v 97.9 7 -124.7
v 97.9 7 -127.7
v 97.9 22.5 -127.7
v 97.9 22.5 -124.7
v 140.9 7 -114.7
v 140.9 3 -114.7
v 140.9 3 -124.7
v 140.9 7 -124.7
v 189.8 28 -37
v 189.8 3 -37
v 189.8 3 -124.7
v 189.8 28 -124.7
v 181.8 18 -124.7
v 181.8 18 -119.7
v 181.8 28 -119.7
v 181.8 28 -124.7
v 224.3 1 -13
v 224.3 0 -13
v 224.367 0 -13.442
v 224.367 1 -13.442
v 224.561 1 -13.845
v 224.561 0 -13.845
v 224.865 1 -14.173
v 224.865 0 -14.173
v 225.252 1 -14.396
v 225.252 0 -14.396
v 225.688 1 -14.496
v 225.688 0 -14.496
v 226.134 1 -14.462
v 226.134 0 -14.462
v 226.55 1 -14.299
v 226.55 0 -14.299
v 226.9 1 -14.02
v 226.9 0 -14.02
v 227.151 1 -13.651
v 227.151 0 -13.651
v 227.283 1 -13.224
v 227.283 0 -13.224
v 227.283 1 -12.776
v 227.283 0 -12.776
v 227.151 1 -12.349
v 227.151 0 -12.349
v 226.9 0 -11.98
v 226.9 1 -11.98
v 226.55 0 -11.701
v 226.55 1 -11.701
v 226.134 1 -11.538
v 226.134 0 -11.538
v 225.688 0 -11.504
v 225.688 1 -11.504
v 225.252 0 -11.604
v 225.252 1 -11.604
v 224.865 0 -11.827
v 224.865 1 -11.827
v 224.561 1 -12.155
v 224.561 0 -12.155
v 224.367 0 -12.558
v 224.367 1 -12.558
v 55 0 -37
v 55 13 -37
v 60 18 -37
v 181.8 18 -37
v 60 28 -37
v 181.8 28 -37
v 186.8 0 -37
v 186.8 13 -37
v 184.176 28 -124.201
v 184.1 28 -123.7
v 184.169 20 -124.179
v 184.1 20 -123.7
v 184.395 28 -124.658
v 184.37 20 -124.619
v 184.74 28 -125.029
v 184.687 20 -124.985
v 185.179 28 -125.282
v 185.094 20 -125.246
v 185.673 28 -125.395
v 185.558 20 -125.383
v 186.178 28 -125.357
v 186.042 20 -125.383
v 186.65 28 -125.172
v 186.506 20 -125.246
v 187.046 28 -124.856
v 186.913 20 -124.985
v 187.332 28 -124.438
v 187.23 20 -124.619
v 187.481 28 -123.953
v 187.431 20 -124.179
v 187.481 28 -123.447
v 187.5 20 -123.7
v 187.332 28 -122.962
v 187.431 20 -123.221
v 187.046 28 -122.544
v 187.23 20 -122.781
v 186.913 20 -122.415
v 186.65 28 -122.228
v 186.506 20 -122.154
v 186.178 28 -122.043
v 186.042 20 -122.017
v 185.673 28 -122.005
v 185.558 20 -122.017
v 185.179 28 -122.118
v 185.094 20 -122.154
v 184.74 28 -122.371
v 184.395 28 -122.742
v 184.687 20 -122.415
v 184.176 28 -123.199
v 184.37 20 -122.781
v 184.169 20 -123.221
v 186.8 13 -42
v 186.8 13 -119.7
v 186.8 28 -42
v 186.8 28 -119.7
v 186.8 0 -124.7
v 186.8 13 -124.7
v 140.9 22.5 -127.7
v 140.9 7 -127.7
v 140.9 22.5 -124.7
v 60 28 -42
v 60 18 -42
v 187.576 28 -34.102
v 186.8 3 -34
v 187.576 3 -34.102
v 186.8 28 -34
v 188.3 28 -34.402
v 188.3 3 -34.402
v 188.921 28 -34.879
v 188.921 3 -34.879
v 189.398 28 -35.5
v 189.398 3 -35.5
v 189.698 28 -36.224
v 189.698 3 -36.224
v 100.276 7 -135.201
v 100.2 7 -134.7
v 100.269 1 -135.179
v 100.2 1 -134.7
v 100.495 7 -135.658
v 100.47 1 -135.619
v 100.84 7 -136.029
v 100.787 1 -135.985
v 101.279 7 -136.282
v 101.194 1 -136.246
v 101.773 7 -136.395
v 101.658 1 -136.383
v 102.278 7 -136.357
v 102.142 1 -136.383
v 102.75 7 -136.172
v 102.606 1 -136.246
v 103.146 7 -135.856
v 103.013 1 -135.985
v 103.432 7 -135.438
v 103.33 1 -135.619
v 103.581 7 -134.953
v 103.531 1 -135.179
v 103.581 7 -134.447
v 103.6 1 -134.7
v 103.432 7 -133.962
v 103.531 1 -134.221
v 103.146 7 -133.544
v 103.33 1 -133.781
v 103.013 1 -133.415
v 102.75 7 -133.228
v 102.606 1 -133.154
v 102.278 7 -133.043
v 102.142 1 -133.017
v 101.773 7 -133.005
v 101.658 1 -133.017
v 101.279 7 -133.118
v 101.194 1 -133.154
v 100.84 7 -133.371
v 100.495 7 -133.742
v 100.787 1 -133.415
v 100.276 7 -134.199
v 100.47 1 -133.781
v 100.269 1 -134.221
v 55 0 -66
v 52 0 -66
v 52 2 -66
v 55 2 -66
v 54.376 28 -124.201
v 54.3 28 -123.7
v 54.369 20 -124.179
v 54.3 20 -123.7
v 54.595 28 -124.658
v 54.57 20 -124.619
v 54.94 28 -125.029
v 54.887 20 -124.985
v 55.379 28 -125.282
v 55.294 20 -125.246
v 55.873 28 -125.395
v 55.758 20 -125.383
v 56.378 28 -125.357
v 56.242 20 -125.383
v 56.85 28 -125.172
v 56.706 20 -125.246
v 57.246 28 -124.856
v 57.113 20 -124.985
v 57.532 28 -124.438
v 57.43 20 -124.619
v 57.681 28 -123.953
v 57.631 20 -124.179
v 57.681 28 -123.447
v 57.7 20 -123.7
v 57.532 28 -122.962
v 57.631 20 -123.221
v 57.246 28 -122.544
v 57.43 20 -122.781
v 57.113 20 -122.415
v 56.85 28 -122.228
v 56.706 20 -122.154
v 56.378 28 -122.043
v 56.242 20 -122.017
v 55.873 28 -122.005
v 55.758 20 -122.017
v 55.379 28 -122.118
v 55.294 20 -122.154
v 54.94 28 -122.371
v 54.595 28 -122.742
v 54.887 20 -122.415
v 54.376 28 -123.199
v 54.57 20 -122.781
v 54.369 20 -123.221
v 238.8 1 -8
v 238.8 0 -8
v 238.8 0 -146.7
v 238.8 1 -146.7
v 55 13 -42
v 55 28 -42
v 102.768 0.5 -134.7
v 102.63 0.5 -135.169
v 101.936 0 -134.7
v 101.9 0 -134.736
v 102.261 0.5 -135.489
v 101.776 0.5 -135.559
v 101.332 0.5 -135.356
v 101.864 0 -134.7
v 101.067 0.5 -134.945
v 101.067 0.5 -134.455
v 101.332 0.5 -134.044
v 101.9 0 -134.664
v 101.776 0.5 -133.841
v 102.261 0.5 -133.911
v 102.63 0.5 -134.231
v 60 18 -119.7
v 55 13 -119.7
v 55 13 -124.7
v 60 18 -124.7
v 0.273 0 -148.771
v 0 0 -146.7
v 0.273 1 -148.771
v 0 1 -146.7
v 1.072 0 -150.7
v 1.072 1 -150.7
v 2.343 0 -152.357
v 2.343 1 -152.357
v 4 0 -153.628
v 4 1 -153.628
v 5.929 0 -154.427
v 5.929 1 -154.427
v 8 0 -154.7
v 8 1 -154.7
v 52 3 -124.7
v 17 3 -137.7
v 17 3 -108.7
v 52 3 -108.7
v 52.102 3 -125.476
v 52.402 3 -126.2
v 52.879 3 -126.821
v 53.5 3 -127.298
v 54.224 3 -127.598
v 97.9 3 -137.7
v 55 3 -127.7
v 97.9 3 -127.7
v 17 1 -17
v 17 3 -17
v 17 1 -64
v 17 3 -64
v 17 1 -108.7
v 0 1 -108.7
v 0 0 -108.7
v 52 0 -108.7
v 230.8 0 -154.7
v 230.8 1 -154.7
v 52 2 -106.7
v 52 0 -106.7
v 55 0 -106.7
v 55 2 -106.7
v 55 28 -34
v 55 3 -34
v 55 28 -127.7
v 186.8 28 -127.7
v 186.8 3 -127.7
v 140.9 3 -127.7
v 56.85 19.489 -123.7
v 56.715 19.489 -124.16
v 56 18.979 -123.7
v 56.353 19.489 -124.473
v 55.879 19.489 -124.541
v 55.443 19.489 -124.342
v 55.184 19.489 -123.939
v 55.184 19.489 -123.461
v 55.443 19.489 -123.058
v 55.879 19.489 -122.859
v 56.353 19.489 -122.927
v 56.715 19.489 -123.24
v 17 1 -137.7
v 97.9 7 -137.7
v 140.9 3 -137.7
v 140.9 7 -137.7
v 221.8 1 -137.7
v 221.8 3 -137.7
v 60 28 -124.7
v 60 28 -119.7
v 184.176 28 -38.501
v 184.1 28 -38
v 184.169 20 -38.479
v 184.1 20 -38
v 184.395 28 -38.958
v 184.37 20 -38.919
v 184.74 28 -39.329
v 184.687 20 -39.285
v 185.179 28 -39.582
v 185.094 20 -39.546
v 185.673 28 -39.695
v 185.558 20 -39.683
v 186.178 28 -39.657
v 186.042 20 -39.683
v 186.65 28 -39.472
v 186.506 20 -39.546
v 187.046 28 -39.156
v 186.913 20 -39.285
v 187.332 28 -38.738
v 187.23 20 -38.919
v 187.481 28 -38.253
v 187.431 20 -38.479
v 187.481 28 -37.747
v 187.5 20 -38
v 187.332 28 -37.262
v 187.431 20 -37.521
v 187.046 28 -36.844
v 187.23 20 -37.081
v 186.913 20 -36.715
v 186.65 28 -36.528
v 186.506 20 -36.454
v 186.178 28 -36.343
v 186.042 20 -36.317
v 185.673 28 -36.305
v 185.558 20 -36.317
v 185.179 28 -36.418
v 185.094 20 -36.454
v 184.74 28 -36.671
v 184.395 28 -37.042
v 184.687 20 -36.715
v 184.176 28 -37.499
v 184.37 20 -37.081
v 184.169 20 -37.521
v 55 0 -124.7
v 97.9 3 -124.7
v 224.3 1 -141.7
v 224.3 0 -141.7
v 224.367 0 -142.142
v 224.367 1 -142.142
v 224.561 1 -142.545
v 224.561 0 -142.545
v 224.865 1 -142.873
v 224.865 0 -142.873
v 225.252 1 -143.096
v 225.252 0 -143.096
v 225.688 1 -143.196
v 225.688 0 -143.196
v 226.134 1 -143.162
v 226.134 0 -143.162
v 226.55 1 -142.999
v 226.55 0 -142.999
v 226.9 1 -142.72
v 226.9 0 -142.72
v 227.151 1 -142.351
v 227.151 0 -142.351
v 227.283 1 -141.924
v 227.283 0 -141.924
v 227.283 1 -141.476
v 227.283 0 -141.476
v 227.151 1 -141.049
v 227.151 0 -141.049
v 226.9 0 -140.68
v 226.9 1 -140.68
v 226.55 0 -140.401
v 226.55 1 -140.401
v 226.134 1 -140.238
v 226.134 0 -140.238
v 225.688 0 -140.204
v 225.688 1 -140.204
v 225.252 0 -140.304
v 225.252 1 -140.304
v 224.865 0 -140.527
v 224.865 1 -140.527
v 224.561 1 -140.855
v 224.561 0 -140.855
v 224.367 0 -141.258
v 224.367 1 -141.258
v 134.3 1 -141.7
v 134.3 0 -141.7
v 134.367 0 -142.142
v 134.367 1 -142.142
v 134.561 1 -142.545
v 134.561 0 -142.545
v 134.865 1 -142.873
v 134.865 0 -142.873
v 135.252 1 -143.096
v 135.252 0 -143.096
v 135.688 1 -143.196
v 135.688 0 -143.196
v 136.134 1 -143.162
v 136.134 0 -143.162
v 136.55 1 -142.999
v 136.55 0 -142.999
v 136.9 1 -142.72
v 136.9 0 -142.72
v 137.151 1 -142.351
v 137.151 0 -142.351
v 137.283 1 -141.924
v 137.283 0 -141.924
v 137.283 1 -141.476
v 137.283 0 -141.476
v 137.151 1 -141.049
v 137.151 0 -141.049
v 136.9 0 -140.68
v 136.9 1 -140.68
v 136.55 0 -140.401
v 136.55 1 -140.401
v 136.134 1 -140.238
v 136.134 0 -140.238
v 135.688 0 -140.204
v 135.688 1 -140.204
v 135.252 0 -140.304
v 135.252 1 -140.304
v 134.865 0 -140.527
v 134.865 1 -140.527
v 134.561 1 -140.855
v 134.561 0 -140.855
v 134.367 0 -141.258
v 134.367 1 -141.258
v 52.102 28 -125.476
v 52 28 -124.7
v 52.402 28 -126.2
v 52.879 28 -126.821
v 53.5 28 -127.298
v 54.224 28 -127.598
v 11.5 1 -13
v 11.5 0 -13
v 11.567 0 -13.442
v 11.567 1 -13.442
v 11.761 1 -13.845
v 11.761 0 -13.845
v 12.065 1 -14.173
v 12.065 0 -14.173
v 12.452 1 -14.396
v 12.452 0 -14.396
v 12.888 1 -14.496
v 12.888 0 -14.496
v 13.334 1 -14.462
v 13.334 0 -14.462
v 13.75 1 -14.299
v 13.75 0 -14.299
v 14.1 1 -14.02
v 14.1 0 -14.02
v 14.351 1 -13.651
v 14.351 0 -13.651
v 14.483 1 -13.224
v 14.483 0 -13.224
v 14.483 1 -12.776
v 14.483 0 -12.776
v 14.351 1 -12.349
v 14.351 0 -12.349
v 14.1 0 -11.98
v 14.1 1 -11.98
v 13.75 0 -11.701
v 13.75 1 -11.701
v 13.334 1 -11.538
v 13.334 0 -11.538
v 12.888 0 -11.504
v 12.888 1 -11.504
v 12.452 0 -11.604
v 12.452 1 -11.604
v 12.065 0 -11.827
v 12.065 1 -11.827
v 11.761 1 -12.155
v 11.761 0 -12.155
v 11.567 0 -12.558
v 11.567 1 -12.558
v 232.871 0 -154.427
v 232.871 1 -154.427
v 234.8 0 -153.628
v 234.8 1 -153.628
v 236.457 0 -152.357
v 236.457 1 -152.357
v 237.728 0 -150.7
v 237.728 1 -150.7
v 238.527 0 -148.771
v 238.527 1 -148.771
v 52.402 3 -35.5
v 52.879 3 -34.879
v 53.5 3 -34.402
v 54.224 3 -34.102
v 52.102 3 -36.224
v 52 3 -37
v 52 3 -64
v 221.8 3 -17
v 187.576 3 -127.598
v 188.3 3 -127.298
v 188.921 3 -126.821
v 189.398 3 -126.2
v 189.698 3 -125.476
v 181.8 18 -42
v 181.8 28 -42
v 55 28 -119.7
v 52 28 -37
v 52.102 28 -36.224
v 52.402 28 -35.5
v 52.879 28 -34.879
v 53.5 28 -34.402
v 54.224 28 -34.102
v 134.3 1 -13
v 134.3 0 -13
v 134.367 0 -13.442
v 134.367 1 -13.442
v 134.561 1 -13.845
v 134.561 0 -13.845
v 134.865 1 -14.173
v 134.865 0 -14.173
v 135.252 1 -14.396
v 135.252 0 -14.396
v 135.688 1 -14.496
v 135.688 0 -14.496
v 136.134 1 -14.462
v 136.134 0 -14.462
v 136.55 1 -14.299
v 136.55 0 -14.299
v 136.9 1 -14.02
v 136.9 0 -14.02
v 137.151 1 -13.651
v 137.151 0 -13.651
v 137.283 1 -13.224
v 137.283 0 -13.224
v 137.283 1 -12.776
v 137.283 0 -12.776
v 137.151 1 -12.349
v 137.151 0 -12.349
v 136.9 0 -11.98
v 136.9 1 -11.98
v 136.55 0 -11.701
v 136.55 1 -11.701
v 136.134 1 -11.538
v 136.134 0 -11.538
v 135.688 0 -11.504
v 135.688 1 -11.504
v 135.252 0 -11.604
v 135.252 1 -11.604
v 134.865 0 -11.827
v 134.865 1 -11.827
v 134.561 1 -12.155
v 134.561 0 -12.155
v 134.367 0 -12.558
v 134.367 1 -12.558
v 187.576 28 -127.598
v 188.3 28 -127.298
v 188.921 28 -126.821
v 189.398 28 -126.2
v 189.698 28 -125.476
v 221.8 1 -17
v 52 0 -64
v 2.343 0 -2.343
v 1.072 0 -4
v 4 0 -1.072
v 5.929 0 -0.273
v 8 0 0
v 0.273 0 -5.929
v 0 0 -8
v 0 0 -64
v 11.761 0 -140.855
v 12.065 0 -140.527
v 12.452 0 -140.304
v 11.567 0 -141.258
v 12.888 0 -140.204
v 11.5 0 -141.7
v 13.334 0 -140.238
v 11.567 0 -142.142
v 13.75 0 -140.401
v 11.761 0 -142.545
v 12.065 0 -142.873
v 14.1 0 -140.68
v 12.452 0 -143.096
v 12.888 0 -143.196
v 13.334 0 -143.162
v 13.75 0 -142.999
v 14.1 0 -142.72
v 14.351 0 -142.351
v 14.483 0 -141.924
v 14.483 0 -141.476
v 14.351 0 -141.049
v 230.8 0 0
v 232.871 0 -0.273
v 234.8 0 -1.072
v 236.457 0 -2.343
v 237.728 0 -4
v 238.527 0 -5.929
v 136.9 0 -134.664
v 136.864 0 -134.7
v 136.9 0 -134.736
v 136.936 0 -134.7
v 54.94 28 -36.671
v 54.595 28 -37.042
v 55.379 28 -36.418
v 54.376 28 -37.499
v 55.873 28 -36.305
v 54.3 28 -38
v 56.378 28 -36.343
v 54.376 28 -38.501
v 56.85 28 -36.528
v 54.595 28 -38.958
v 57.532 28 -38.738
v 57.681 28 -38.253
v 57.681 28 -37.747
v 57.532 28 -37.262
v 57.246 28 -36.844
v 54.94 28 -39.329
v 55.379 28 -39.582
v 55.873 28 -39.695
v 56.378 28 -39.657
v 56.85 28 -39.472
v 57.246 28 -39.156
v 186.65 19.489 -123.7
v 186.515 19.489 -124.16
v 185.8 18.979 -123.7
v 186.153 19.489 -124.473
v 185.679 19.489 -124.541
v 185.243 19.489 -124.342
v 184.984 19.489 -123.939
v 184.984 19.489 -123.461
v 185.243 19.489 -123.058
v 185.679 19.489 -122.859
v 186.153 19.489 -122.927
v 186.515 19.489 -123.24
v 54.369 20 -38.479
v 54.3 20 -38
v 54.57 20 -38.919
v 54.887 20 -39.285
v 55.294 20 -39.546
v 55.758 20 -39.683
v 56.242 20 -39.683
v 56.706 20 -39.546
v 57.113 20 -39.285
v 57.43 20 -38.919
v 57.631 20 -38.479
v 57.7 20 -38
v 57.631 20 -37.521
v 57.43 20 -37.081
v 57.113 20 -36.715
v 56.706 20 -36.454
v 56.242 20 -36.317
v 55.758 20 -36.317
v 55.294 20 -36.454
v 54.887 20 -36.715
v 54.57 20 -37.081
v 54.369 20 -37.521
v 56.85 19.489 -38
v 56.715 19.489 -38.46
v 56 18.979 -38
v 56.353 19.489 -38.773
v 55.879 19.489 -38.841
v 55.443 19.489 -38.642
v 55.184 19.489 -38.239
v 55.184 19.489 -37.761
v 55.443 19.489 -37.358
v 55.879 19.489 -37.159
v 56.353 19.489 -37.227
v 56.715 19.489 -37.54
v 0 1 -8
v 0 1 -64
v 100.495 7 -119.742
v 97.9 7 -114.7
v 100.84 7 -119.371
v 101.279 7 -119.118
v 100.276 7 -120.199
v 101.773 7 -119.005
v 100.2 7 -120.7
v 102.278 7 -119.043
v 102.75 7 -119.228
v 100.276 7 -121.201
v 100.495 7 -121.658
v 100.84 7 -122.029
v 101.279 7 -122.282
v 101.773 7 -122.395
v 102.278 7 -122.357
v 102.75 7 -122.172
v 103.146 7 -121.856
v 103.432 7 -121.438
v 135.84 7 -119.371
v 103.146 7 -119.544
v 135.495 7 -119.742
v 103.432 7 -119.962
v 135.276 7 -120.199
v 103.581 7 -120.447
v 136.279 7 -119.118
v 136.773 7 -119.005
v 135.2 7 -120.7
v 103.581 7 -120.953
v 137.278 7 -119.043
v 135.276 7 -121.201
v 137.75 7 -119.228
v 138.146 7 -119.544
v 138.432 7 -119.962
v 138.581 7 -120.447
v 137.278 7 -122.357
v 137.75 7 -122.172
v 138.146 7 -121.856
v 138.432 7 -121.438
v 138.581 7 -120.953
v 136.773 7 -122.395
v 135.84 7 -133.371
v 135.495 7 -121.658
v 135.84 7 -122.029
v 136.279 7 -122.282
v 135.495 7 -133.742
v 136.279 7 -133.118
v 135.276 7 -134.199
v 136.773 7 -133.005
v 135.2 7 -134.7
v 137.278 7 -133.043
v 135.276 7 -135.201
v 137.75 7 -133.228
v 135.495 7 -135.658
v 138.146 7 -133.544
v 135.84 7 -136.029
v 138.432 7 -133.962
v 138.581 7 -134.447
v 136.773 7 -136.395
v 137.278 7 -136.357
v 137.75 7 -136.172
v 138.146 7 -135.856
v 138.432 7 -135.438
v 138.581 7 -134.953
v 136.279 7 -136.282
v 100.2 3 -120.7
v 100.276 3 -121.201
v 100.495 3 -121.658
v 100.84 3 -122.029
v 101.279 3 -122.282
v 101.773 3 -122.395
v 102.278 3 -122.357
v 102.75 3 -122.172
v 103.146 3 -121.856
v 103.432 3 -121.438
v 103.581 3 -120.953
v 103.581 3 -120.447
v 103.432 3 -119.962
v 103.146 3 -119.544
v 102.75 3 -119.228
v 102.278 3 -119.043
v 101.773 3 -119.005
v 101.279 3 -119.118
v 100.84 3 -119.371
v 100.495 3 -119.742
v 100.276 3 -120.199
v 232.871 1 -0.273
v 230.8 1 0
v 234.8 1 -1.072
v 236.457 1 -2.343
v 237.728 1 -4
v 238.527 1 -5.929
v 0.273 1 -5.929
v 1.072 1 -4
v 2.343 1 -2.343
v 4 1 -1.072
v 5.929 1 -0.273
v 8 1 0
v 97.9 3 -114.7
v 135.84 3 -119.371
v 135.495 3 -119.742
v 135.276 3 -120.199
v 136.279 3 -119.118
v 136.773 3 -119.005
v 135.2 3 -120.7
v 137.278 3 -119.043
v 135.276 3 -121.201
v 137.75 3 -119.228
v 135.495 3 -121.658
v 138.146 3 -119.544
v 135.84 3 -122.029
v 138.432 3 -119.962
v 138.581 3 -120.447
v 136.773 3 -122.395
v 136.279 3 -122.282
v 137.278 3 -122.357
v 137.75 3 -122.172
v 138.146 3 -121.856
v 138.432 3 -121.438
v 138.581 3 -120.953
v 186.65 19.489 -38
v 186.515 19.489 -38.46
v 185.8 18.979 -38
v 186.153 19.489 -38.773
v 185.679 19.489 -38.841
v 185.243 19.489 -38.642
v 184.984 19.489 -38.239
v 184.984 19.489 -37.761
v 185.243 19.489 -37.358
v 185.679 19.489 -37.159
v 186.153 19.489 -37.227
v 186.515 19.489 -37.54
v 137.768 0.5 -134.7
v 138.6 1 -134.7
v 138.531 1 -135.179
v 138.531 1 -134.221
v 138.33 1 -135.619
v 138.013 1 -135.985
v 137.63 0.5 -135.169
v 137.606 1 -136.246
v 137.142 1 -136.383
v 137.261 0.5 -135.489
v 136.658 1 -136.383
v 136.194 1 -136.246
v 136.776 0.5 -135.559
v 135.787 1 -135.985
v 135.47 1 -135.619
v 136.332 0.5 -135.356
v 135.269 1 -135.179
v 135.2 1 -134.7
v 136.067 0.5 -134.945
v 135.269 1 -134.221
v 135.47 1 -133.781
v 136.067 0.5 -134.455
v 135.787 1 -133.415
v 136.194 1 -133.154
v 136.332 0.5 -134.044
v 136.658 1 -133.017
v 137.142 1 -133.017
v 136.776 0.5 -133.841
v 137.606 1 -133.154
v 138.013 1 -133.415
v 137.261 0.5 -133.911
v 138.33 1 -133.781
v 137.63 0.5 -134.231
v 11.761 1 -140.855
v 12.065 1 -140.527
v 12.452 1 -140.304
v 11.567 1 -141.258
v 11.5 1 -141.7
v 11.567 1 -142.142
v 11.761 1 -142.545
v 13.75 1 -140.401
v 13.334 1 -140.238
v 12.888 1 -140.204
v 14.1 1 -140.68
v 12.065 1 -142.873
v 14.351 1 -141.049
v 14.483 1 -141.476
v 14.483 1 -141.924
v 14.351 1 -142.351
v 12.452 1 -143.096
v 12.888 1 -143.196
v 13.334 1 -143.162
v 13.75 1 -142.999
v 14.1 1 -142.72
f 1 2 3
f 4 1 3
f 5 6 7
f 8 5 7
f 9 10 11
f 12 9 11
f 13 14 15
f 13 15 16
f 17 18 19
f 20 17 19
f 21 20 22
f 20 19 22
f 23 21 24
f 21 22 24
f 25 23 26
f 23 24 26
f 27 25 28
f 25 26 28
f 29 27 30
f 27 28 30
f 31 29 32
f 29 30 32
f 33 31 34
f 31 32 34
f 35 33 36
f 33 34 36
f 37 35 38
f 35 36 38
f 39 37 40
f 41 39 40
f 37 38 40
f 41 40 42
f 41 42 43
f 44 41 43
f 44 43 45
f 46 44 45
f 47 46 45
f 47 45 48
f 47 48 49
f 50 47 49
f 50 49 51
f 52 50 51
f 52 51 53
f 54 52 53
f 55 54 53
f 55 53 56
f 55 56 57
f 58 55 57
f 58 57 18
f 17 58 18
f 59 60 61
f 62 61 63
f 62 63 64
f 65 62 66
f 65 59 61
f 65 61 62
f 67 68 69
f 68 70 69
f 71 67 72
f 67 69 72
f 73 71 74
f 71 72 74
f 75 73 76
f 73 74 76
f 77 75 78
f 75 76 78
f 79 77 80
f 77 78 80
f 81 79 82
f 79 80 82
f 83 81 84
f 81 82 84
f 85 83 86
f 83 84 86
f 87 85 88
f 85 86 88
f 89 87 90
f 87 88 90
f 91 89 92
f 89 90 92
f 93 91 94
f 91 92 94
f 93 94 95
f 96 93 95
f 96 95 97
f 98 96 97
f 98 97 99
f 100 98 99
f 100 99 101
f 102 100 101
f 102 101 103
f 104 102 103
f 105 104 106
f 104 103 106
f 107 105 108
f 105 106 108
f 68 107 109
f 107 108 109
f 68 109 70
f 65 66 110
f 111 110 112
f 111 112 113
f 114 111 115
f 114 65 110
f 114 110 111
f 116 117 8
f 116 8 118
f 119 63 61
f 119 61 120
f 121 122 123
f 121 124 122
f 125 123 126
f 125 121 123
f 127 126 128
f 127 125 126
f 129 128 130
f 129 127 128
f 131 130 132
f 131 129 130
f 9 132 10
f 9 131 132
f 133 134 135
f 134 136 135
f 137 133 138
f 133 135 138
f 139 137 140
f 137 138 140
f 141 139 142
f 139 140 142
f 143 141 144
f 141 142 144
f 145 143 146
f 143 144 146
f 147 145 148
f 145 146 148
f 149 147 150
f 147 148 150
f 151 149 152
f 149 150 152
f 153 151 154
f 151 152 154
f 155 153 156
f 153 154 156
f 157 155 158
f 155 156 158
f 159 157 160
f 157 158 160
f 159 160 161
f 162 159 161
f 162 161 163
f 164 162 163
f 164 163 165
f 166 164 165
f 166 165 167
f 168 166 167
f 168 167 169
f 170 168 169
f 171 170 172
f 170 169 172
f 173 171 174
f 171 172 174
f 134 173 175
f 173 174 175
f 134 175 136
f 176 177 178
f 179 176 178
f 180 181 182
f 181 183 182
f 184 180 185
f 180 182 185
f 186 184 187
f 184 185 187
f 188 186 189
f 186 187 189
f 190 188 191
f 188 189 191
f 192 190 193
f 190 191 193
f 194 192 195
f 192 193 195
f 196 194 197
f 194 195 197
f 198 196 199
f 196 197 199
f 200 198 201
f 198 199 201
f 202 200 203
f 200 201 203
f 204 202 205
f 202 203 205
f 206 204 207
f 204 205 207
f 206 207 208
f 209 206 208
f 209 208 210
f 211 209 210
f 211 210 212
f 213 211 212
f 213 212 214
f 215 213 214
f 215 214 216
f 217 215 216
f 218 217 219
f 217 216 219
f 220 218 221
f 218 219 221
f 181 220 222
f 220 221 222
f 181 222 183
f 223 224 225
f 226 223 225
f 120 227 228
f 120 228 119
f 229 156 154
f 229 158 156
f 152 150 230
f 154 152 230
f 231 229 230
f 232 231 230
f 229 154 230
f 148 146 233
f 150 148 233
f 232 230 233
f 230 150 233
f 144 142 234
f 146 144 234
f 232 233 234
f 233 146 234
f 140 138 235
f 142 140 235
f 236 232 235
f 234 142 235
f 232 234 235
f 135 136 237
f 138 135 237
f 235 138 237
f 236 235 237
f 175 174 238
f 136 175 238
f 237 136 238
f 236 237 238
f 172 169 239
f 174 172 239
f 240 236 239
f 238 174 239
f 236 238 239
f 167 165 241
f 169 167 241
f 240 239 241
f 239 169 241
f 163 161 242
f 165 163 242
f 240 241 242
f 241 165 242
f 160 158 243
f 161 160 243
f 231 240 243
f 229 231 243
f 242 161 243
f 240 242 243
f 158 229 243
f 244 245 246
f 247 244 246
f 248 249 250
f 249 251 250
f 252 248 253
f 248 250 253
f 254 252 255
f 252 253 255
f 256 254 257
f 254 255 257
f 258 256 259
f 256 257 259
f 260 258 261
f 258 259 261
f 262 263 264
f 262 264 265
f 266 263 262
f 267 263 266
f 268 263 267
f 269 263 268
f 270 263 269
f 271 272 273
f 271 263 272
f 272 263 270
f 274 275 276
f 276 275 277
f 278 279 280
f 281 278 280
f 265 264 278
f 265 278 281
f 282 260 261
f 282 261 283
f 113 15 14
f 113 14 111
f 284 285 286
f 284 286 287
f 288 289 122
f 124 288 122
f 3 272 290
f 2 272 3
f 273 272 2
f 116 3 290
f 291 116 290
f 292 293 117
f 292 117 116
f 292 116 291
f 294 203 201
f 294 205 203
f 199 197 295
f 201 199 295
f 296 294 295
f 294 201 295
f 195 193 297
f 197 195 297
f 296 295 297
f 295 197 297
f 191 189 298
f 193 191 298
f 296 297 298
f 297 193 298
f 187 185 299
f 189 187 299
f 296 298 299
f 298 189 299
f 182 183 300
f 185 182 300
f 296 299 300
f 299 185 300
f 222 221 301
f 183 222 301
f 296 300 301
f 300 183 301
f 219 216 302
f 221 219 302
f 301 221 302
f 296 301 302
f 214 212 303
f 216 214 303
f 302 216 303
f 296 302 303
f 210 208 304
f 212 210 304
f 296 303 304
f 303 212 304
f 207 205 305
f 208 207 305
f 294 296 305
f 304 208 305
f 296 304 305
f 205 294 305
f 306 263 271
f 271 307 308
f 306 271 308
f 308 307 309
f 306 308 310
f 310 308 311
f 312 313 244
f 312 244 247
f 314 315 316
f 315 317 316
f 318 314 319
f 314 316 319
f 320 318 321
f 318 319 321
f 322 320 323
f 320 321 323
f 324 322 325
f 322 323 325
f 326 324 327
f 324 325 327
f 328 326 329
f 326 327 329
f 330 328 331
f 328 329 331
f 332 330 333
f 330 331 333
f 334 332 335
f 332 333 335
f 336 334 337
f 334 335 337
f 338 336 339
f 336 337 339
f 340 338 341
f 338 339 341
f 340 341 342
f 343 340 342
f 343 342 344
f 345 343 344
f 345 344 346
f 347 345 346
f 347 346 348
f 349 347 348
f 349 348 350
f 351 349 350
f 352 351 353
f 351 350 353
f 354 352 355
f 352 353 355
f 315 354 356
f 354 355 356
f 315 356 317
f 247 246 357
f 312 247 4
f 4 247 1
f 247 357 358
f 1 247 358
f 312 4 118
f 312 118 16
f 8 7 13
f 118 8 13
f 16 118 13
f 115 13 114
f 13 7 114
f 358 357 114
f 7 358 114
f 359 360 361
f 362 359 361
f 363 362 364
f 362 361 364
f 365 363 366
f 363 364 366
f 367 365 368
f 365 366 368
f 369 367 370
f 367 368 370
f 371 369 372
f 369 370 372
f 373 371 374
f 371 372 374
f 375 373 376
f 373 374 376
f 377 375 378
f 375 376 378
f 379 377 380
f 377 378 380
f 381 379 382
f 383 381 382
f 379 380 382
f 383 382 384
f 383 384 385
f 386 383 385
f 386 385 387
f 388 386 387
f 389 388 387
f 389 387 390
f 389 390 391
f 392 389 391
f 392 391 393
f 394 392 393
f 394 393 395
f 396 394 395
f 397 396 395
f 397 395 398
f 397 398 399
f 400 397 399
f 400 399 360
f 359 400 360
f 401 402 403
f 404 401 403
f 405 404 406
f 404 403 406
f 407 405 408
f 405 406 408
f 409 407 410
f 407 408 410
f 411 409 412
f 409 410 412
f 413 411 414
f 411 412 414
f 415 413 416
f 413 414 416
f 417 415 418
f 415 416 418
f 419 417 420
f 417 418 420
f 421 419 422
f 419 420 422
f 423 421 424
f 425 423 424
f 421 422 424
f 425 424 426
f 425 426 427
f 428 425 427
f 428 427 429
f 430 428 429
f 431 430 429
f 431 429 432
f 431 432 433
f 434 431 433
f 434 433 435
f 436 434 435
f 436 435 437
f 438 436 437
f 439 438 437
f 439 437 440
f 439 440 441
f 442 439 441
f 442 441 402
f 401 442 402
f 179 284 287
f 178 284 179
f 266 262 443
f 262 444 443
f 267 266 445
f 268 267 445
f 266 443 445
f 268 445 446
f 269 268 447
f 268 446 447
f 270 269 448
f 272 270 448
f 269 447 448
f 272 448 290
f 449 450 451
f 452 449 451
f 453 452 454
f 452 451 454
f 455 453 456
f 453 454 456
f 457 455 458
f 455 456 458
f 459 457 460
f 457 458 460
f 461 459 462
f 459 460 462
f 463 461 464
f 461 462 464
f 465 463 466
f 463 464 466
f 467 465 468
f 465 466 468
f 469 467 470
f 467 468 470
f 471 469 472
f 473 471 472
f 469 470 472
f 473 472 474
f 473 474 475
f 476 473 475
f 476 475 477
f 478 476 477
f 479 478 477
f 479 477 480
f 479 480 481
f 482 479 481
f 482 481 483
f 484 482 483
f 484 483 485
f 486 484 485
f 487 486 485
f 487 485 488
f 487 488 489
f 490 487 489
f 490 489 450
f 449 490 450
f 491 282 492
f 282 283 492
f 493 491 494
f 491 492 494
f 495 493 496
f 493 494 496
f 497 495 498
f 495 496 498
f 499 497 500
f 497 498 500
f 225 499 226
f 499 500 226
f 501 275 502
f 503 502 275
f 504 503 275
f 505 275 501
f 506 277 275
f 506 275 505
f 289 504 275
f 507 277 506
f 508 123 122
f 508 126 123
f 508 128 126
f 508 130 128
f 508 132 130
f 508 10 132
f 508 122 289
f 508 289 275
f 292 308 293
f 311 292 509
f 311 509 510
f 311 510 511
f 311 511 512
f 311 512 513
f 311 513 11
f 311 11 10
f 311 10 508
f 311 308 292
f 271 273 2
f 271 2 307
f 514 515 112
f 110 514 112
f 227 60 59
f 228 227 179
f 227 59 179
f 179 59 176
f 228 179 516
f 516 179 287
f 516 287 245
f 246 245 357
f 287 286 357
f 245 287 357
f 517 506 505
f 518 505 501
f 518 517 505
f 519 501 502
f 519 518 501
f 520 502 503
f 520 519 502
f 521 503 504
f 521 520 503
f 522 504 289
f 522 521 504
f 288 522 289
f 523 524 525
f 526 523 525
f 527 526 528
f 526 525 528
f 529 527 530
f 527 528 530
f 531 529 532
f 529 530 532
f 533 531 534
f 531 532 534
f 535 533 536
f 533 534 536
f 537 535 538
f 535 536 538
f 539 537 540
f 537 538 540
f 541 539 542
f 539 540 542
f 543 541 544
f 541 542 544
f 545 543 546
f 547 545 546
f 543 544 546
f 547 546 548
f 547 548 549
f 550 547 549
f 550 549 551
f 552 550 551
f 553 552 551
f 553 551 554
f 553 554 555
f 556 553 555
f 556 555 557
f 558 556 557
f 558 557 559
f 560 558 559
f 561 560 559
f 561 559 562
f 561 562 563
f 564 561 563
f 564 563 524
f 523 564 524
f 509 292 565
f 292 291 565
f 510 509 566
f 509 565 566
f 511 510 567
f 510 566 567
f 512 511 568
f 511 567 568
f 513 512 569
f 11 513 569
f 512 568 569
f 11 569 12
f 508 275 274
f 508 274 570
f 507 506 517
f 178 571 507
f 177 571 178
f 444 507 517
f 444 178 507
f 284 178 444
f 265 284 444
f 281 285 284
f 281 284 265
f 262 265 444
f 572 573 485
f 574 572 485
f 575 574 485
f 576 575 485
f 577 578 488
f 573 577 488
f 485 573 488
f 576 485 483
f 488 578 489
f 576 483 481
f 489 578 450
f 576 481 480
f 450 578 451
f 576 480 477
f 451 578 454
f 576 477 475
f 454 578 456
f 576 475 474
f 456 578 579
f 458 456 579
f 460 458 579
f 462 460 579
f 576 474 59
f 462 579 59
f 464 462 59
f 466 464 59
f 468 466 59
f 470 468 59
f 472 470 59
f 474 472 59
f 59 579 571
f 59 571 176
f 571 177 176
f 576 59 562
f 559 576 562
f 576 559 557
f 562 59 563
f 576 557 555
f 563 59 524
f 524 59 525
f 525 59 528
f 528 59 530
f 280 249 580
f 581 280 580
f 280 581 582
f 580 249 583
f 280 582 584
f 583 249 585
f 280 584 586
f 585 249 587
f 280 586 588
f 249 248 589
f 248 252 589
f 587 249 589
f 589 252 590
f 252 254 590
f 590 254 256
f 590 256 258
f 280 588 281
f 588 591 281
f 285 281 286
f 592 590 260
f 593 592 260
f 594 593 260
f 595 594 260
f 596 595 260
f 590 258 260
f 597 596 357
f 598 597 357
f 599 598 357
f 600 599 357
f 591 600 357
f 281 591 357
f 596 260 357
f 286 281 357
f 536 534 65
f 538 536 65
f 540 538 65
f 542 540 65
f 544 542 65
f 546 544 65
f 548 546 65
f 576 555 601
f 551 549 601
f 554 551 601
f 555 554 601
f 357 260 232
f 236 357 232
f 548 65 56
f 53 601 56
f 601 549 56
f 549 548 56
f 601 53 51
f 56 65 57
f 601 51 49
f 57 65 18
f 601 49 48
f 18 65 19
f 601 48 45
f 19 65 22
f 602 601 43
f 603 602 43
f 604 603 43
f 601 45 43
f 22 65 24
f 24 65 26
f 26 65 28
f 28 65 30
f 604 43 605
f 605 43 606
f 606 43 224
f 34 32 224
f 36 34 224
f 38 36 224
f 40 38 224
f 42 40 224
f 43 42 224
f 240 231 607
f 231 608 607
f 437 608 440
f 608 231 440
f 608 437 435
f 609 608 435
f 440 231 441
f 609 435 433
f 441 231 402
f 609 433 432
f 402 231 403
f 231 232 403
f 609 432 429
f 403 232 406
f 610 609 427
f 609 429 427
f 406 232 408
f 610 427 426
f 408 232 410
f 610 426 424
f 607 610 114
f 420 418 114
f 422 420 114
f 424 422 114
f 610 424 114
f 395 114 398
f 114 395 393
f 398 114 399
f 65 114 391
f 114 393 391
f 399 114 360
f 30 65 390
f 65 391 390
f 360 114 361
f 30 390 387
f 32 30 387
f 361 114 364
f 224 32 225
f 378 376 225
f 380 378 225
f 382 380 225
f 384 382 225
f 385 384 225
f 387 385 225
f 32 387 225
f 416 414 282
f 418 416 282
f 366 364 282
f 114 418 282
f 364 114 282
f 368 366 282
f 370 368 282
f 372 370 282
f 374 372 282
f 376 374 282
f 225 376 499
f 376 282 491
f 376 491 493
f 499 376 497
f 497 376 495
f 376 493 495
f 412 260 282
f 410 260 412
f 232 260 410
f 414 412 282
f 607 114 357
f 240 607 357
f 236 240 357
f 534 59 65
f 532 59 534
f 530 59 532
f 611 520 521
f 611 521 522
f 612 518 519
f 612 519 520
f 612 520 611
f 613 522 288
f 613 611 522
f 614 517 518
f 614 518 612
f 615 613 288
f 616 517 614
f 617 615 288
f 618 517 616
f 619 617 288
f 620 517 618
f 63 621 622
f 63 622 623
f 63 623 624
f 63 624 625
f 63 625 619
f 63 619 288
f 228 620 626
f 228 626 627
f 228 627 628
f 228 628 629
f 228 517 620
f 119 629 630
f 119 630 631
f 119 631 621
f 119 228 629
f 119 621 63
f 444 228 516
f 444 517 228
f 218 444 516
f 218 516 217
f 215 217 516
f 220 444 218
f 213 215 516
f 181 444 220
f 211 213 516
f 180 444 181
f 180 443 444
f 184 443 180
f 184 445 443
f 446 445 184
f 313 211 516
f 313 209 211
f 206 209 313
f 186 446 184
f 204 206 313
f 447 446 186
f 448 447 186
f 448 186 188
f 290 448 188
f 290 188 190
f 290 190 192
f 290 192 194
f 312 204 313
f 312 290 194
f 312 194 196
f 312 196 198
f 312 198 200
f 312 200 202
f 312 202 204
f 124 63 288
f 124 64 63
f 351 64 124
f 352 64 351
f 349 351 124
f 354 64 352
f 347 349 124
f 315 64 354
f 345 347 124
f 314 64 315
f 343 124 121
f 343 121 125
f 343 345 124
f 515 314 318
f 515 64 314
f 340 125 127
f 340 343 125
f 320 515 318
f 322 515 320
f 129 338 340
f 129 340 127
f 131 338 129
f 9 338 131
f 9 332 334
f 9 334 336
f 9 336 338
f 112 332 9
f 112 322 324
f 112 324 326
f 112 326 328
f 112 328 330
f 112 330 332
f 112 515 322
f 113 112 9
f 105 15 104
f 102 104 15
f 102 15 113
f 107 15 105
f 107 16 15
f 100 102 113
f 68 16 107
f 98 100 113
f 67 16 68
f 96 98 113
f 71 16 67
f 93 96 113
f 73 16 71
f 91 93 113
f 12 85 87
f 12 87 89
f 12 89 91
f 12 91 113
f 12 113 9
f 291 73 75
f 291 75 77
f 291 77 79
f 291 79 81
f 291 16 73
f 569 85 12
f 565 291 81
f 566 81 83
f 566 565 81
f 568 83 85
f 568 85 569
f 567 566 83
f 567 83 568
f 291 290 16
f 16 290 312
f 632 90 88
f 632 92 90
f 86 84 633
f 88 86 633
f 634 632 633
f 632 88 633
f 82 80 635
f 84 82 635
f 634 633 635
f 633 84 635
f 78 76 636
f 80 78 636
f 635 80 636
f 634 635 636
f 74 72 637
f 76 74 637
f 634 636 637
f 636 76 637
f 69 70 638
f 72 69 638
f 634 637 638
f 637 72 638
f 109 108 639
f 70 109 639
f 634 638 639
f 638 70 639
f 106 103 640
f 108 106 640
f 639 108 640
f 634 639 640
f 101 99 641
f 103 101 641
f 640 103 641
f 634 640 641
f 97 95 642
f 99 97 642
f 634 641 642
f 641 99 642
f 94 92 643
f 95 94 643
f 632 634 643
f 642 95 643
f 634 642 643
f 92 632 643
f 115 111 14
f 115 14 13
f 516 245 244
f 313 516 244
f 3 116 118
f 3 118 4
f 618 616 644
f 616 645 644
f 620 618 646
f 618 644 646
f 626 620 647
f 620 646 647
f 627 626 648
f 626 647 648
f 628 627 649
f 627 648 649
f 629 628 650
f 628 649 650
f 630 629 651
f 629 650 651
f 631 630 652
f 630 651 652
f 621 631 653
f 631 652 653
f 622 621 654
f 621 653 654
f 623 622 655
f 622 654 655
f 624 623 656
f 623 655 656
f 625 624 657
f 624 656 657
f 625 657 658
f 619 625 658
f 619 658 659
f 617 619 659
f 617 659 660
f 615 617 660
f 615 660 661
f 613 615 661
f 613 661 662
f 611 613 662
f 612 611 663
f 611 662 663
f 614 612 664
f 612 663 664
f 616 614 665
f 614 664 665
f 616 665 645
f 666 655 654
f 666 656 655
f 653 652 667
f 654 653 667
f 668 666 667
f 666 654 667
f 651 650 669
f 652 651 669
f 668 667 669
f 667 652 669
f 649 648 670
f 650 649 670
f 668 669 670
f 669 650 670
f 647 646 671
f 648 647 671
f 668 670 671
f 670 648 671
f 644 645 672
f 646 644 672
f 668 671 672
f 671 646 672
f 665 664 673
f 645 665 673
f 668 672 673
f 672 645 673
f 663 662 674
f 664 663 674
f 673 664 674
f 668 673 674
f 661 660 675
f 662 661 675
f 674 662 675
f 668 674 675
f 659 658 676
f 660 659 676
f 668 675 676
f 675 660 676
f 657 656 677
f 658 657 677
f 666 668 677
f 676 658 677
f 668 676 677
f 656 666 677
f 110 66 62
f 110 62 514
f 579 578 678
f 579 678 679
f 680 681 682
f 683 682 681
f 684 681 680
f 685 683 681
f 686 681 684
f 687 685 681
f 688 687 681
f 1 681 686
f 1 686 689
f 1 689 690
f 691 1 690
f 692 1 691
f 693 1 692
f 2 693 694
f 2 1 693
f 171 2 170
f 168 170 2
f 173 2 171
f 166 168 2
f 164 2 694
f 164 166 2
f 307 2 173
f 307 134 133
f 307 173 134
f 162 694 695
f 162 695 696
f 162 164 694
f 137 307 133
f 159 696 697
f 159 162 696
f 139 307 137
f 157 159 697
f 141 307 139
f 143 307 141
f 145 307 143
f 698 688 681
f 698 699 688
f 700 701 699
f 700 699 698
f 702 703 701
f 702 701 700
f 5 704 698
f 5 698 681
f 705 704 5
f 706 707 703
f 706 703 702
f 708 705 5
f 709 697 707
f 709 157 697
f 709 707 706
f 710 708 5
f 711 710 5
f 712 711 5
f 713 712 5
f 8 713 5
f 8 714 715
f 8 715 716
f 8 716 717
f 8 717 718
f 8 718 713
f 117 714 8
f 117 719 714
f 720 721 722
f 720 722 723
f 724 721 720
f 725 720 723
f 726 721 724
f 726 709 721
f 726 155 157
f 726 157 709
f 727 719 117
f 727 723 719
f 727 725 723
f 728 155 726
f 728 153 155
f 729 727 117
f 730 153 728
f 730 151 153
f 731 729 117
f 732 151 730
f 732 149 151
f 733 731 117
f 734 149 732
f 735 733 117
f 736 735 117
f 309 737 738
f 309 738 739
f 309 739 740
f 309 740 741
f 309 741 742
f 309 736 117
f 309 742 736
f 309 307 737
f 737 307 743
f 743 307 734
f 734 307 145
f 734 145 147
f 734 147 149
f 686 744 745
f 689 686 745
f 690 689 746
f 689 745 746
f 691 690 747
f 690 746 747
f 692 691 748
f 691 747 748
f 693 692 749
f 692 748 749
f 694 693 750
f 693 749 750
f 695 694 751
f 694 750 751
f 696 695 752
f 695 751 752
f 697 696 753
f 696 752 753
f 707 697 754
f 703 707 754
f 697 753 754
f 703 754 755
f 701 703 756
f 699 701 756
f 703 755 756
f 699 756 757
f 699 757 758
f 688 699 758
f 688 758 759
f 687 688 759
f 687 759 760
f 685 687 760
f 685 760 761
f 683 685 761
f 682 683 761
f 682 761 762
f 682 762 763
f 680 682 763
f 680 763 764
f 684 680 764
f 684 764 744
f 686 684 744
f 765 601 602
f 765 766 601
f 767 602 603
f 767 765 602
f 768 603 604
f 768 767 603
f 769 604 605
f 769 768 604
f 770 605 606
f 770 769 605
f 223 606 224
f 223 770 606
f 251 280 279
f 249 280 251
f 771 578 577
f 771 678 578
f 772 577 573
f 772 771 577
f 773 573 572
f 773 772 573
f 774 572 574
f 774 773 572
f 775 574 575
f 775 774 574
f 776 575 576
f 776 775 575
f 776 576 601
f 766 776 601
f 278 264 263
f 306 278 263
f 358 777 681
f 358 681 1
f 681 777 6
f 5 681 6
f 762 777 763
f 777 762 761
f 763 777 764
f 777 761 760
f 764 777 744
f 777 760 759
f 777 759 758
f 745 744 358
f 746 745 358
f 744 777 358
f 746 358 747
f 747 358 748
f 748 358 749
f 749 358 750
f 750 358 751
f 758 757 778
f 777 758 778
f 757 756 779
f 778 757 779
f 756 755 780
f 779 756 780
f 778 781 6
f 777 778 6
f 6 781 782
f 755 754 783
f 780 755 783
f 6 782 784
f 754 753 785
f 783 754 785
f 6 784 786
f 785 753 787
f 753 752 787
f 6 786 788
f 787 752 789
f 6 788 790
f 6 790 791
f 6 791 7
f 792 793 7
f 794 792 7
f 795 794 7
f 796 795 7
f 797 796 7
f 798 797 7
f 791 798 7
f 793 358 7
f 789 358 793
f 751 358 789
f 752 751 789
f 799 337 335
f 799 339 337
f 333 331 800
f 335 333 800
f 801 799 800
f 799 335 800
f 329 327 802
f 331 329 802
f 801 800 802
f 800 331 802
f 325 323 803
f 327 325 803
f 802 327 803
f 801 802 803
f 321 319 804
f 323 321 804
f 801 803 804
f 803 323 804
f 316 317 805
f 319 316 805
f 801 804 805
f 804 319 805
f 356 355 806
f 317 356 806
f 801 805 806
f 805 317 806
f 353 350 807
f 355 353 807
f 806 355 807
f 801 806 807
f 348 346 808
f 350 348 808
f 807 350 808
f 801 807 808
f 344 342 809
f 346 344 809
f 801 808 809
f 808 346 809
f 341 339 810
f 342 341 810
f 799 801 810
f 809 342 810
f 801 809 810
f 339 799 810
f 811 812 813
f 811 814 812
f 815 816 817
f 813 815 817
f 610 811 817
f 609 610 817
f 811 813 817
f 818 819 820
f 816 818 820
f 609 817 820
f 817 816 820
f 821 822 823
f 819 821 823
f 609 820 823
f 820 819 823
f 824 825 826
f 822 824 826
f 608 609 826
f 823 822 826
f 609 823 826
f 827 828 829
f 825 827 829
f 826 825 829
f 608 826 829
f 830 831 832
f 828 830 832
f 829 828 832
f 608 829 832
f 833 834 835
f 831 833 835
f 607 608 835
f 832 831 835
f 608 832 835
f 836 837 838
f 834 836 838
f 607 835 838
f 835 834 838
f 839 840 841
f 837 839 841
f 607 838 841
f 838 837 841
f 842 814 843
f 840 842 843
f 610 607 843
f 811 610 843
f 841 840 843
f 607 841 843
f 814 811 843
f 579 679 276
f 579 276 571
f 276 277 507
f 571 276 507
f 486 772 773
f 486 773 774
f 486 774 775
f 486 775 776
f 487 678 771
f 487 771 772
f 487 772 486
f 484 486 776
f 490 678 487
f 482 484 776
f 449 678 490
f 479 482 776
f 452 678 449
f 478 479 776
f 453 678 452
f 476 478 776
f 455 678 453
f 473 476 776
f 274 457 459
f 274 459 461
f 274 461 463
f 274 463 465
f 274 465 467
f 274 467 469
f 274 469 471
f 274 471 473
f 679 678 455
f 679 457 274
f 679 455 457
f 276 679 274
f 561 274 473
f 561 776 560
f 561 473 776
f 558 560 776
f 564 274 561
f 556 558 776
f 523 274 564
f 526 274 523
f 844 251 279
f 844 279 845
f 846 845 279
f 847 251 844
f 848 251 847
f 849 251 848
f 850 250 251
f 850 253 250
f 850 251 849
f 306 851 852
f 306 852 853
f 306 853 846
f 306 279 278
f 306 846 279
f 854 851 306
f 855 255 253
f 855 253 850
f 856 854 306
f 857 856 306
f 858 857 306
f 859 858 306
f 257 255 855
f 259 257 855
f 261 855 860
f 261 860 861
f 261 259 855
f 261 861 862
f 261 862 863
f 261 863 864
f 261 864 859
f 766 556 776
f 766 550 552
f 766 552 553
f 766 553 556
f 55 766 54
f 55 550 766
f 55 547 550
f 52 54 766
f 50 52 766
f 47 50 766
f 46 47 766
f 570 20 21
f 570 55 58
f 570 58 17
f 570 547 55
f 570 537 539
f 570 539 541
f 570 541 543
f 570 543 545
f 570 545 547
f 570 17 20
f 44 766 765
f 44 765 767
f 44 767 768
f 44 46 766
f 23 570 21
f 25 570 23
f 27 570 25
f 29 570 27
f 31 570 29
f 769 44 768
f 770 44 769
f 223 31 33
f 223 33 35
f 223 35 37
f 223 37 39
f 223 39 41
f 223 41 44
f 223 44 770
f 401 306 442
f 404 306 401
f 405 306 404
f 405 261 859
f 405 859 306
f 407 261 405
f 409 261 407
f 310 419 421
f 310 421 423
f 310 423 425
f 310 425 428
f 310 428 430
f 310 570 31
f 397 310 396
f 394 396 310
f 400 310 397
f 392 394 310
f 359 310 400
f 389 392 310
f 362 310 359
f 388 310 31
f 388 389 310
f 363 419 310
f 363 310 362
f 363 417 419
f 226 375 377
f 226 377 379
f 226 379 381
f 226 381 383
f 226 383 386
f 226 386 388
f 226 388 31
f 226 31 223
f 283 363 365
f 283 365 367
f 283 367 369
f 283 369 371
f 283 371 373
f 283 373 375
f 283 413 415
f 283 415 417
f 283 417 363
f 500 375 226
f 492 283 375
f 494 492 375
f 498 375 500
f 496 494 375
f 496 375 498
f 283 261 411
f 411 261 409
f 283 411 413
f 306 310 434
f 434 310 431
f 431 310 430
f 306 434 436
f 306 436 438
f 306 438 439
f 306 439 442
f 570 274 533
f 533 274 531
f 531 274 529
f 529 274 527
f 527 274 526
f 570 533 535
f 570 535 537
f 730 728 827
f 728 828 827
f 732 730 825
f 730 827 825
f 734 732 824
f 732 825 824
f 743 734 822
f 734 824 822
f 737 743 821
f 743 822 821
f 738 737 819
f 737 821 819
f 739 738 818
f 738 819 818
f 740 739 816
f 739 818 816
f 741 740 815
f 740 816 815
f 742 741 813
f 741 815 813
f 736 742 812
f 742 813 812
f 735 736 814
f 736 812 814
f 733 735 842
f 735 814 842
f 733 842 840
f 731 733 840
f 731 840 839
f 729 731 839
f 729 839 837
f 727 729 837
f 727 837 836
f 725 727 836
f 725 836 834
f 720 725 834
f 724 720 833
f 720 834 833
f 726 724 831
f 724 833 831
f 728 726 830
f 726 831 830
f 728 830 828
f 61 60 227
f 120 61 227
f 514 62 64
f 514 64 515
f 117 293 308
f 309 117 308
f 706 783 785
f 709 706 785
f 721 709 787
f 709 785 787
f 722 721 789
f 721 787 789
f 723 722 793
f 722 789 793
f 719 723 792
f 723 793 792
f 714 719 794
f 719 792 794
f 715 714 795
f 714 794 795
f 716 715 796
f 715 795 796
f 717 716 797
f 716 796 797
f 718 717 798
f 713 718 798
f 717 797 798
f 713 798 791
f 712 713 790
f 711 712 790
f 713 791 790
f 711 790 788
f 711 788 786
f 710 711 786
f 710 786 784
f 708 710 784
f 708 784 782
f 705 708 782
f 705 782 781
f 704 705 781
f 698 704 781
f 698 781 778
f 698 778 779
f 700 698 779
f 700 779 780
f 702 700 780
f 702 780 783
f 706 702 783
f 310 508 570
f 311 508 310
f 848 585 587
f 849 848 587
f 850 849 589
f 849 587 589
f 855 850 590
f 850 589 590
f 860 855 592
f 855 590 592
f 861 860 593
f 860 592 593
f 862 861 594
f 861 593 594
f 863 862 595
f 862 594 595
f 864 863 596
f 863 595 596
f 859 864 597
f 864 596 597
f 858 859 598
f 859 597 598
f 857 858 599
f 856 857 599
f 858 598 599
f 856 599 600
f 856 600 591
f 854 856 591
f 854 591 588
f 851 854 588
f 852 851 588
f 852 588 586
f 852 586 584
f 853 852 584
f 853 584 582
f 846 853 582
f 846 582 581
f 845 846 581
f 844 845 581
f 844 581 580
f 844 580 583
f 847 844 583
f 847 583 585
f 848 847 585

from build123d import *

# Parameters (mm, degrees)
SKIZZE1_W                            = 238.8
SKIZZE1_H                            = 154.7
AUFSATZ_LINEAR_AUSTRAGEN1_DEPTH      = 3
SKIZZE2_W                            = 238.8
SKIZZE2_H                            = 154.7
SKIZZE2_W_2                          = 204.8
SKIZZE2_H_2                          = 120.7
SCHNITT_LINEAR_AUSTRAGEN2_DEPTH      = 2
VERRUNDUNG3_R                        = 8
F_3_0_3_DURCHMESSER_BOHRUNG1_D       = 3
SKIZZE6_W                            = 52
SKIZZE6_H                            = 44.7
SCHNITT_LINEAR_AUSTRAGEN3_DEPTH      = 285.546182543
SKIZZE7_W                            = 131.8
SKIZZE7_H                            = 87.7
SCHNITT_LINEAR_AUSTRAGEN4_DEPTH      = 285.546182543
SKIZZE5_W                            = 137.8
SKIZZE5_H                            = 93.7
SKIZZE5_W_2                          = 131.8
SKIZZE5_H_2                          = 87.7
AUFSATZ_LINEAR_AUSTRAGEN2_DEPTH      = 25
SCHNITT_LINEAR_AUSTRAGEN5_REACH      = 246.152
SKIZZE8_W                            = 40.7
SKIZZE8_H                            = 2
SKIZZE9_W                            = 43
SKIZZE9_H                            = 23
AUFSATZ_LINEAR_AUSTRAGEN3_DEPTH      = 4
F_3_4_3_4_DURCHMESSER_BOHRUNG1_D     = 3.4
F_3_4_3_4_DURCHMESSER_BOHRUNG1_DEPTH = 6
F_3_4_3_4_DURCHMESSER_BOHRUNG1_TIP   = 1.021463052
SCHNITT_LINEAR_AUSTRAGEN6_REACH      = 274.244
SKIZZE12_W                           = 43
SKIZZE12_H                           = 15.5
SKIZZE13_W                           = 5
SKIZZE13_H                           = 5
AUFSATZ_LINEAR_AUSTRAGEN4_DEPTH      = 15
F_3_4_3_4_DURCHMESSER_BOHRUNG2_D     = 3.4
F_3_4_3_4_DURCHMESSER_BOHRUNG2_DEPTH = 8
F_3_4_3_4_DURCHMESSER_BOHRUNG2_TIP   = 1.021463052
FASE1_SIZE                           = 5
VERRUNDUNG4_R                        = 3


with BuildPart() as part:
    # Skizze1 → Aufsatz-Linear austragen1 (new body)
    with BuildSketch(Plane(origin=(0, 0, 0), x_dir=(1, 0, 0), z_dir=(0, 1, 0))):
        with Locations((119.4, 77.35)):
            Rectangle(SKIZZE1_W, SKIZZE1_H)
    extrude(amount=AUFSATZ_LINEAR_AUSTRAGEN1_DEPTH)

    # Skizze2 → Schnitt-Linear austragen2 (cut)
    with BuildSketch(Plane(origin=(0, 3, 0), x_dir=(1, 0, 0), z_dir=(0, 1, 0))):
        with Locations((119.4, 77.35)):
            Rectangle(SKIZZE2_W, SKIZZE2_H)
        with Locations((119.4, 77.35)):
            Rectangle(SKIZZE2_W_2, SKIZZE2_H_2, mode=Mode.SUBTRACT)
    extrude(amount=-SCHNITT_LINEAR_AUSTRAGEN2_DEPTH, mode=Mode.SUBTRACT)

    # Verrundung3
    verrundung3_edges = [part.edges().sort_by_distance(p)[0] for p in [
        (0, 0.5, -154.7),
        (238.8, 0.5, -154.7),
        (238.8, 0.5, 0),
        (0, 0.5, 0),
    ]]
    fillet(verrundung3_edges, radius=VERRUNDUNG3_R)

    # Ø3.0 (3) Durchmesser Bohrung1 (through all)
    with Locations(Plane(origin=(0, 1, 0), x_dir=(1, 0, 0), z_dir=(0, 1, 0))):
        with Locations((13, 13), (135.8, 13), (225.8, 13), (225.8, 141.7), (135.8, 141.7), (13, 141.7)):
            Hole(F_3_0_3_DURCHMESSER_BOHRUNG1_D / 2)

    # Skizze6 → Schnitt-Linear austragen3 (cut, through all)
    with BuildSketch(Plane(origin=(0, 3, 0), x_dir=(1, 0, 0), z_dir=(0, 1, 0))):
        with Locations((26, 86.35)):
            Rectangle(SKIZZE6_W, SKIZZE6_H)
    extrude(amount=-SCHNITT_LINEAR_AUSTRAGEN3_DEPTH, mode=Mode.SUBTRACT)

    # Skizze7 → Schnitt-Linear austragen4 (cut, through all)
    with BuildSketch(Plane(origin=(0, 3, 0), x_dir=(1, 0, 0), z_dir=(0, 1, 0))):
        with Locations((120.9, 80.85)):
            Rectangle(SKIZZE7_W, SKIZZE7_H)
    extrude(amount=-SCHNITT_LINEAR_AUSTRAGEN4_DEPTH, mode=Mode.SUBTRACT)

    # Skizze5 → Aufsatz-Linear austragen2 (add)
    with BuildSketch(Plane(origin=(0, 3, 0), x_dir=(1, 0, 0), z_dir=(0, 1, 0))):
        with Locations((120.9, 80.85)):
            Rectangle(SKIZZE5_W, SKIZZE5_H)
        with Locations((120.9, 80.85)):
            Rectangle(SKIZZE5_W_2, SKIZZE5_H_2, mode=Mode.SUBTRACT)
    extrude(amount=AUFSATZ_LINEAR_AUSTRAGEN2_DEPTH)

    # Skizze8 → Schnitt-Linear austragen5 (cut, up to next)
    with BuildSketch(Plane.ZY.offset(-52), mode=Mode.PRIVATE) as schnitt_linear_austragen5_sk1:
        with Locations((-86.35, 1)):
            Rectangle(SKIZZE8_W, SKIZZE8_H)
    schnitt_linear_austragen5_tool1 = extrude(schnitt_linear_austragen5_sk1.sketch, amount=-SCHNITT_LINEAR_AUSTRAGEN5_REACH, mode=Mode.PRIVATE) & part.part
    add(schnitt_linear_austragen5_tool1.solids().sort_by_distance((52, 1, -86.35))[0], mode=Mode.SUBTRACT)

    # Skizze9 → Aufsatz-Linear austragen3 (add)
    with BuildSketch(Plane(origin=(0, 3, 0), x_dir=(1, 0, 0), z_dir=(0, 1, 0))):
        with Locations((119.4, 126.2)):
            Rectangle(SKIZZE9_W, SKIZZE9_H)
    extrude(amount=AUFSATZ_LINEAR_AUSTRAGEN3_DEPTH)

    # Ø3.4 (3.4) Durchmesser Bohrung1
    with Locations(Plane(origin=(0, 7, 0), x_dir=(1, 0, 0), z_dir=(0, 1, 0))):
        with Locations((101.9, 134.7), (136.9, 134.7), (136.9, 120.7), (101.9, 120.7)):
            Hole(F_3_4_3_4_DURCHMESSER_BOHRUNG1_D / 2, depth=F_3_4_3_4_DURCHMESSER_BOHRUNG1_DEPTH)
            with Locations((0, 0, -(F_3_4_3_4_DURCHMESSER_BOHRUNG1_DEPTH + F_3_4_3_4_DURCHMESSER_BOHRUNG1_TIP / 2))):  # 118° drill point
                Cone(0, F_3_4_3_4_DURCHMESSER_BOHRUNG1_D / 2, F_3_4_3_4_DURCHMESSER_BOHRUNG1_TIP, mode=Mode.SUBTRACT)

    # Skizze12 → Schnitt-Linear austragen6 (cut, up to next)
    with BuildSketch(Plane(origin=(0, 0, -127.7), x_dir=(-1, 0, 0), z_dir=(0, 0, -1)), mode=Mode.PRIVATE) as schnitt_linear_austragen6_sk1:
        with Locations((-119.4, 14.75)):
            Rectangle(SKIZZE12_W, SKIZZE12_H)
    schnitt_linear_austragen6_tool1 = extrude(schnitt_linear_austragen6_sk1.sketch, amount=-SCHNITT_LINEAR_AUSTRAGEN6_REACH, mode=Mode.PRIVATE) & part.part
    add(schnitt_linear_austragen6_tool1.solids().sort_by_distance((119.4, 14.75, -127.7))[0], mode=Mode.SUBTRACT)

    # Skizze13 → Aufsatz-Linear austragen4 (add)
    with BuildSketch(Plane(origin=(0, 28, 0), x_dir=(1, 0, 0), z_dir=(0, 1, 0))):
        with Locations((57.5, 122.2)):
            Rectangle(SKIZZE13_W, SKIZZE13_H)
        with Locations((184.3, 122.2)):
            Rectangle(SKIZZE13_W, SKIZZE13_H)
        with Locations((184.3, 39.5)):
            Rectangle(SKIZZE13_W, SKIZZE13_H)
        with Locations((57.5, 39.5)):
            Rectangle(SKIZZE13_W, SKIZZE13_H)
    extrude(amount=-AUFSATZ_LINEAR_AUSTRAGEN4_DEPTH)

    # Ø3.4 (3.4) Durchmesser Bohrung2
    with Locations(Plane(origin=(0, 28, 0), x_dir=(1, 0, 0), z_dir=(0, 1, 0))):
        with Locations((56, 123.7), (185.8, 123.7), (185.8, 38), (56, 38)):
            Hole(F_3_4_3_4_DURCHMESSER_BOHRUNG2_D / 2, depth=F_3_4_3_4_DURCHMESSER_BOHRUNG2_DEPTH)
            with Locations((0, 0, -(F_3_4_3_4_DURCHMESSER_BOHRUNG2_DEPTH + F_3_4_3_4_DURCHMESSER_BOHRUNG2_TIP / 2))):  # 118° drill point
                Cone(0, F_3_4_3_4_DURCHMESSER_BOHRUNG2_D / 2, F_3_4_3_4_DURCHMESSER_BOHRUNG2_TIP, mode=Mode.SUBTRACT)

    # Fase1
    fase1_edges = [part.edges().sort_by_distance(p)[0] for p in [
        (60, 13, -39.5),
        (181.8, 13, -39.5),
        (181.8, 13, -122.2),
        (60, 13, -122.2),
    ]]
    chamfer(fase1_edges, length=FASE1_SIZE - 0.0001)  # a hair under: the kernel refuses the full size

    # Verrundung4
    verrundung4_edges = [part.edges().sort_by_distance(p)[0] for p in [
        (52, 15.5, -127.7),
        (52, 15.5, -34),
        (189.8, 15.5, -34),
        (189.8, 15.5, -127.7),
    ]]
    fillet(verrundung4_edges, radius=VERRUNDUNG4_R)


solid = part.part
